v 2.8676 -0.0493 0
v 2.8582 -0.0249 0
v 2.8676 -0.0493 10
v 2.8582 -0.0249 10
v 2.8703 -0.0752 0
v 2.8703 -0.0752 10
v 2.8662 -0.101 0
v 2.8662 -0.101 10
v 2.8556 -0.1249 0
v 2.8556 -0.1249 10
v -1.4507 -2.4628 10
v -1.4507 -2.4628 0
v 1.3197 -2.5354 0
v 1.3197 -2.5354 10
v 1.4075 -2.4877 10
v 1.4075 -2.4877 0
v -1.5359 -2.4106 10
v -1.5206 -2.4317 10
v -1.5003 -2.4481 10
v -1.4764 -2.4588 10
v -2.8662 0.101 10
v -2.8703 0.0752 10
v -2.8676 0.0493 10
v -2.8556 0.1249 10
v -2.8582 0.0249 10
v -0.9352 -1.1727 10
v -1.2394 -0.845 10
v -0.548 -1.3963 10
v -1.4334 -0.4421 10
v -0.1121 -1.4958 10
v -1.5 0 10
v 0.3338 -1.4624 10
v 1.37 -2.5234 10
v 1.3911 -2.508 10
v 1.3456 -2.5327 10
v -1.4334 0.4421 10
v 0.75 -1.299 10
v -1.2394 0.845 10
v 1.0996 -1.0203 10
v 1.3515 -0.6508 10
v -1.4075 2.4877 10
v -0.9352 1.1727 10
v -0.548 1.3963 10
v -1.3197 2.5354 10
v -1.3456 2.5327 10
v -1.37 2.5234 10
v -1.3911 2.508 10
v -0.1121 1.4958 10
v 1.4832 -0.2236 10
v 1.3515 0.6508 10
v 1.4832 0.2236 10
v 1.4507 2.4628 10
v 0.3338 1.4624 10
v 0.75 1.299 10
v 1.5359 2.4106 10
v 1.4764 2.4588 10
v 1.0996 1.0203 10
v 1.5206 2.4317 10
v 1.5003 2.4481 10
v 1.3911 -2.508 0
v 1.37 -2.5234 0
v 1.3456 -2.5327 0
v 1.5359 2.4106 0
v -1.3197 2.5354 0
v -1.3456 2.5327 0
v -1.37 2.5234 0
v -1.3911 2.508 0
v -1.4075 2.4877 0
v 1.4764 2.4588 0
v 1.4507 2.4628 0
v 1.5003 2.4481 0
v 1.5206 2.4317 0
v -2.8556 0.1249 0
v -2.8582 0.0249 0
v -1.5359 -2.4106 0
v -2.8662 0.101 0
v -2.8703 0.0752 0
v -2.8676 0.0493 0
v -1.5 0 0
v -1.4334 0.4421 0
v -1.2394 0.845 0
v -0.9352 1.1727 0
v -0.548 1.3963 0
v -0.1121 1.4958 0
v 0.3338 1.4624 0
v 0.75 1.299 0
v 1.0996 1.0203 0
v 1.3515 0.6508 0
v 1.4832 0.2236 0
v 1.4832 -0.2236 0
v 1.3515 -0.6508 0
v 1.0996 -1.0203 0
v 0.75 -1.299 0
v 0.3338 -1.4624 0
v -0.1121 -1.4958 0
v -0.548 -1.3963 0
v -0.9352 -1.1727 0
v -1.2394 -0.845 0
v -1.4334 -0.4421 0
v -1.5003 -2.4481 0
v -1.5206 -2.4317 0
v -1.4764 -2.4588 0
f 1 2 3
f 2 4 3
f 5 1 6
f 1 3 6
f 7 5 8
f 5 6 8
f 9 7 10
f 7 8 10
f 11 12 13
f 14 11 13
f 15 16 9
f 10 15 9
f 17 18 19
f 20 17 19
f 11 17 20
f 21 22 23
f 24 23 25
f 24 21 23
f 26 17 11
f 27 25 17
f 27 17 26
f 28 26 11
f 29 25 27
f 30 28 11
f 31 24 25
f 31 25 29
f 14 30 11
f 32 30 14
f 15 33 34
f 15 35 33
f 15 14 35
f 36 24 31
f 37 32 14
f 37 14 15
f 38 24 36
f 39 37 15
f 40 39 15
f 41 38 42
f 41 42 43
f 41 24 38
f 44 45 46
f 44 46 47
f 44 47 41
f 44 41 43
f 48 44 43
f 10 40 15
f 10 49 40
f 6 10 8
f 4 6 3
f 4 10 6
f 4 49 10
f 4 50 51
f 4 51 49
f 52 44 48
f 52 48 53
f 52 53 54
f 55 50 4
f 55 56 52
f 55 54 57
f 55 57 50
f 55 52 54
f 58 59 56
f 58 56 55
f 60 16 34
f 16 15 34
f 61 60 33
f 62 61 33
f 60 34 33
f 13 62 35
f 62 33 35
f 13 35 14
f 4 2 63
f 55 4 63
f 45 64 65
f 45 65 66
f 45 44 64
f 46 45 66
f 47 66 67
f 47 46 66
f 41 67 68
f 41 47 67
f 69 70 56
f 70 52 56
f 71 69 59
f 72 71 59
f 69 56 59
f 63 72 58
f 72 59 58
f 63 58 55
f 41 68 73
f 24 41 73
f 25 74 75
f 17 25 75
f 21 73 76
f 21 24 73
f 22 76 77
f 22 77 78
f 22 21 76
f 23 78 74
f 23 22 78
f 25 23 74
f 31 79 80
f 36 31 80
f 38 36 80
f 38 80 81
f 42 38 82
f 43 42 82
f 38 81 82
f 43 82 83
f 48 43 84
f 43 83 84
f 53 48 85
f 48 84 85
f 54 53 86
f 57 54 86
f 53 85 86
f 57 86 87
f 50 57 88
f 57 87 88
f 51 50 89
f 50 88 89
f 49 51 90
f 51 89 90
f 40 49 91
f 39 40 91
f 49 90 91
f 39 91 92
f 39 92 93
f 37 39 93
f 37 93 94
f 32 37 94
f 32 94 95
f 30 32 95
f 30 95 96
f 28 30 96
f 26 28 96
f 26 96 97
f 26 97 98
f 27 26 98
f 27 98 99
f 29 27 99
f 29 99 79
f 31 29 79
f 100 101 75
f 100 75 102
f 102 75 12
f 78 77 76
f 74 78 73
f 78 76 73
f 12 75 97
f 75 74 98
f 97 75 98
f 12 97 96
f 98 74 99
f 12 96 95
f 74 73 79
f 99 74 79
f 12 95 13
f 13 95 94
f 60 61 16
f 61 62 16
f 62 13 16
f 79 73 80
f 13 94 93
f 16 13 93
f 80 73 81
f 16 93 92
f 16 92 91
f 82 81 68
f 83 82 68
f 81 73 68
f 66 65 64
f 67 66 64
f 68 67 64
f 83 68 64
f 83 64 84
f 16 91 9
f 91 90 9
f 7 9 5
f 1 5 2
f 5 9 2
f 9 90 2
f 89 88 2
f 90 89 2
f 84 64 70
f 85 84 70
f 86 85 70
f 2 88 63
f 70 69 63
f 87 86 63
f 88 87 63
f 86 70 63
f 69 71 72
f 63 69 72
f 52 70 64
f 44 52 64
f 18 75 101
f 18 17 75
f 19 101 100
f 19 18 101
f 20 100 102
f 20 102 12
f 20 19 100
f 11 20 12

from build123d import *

# Parameters (mm, degrees)
BOSS_EXTRUDE1_DEPTH = 10
M3_TAPPED_HOLE1_D   = 3
FILLET1_R           = 0.1


with BuildPart() as part:
    # Sketch1 → Boss-Extrude1 (new body)
    with BuildSketch(Plane.XY):
        Polygon((1.508379031, 2.461326072), (-1.37738139, 2.536957595), (-2.885760421, 0.075631523), (-1.508379031, -2.461326072), (1.37738139, -2.536957595), (2.885760421, -0.075631523), align=None)
    extrude(amount=BOSS_EXTRUDE1_DEPTH)

    # M3 Tapped Hole1 (through all)
    with Locations(Plane.XY.offset(10)):
        with Locations((0, 0)):
            Hole(M3_TAPPED_HOLE1_D / 2)

    # Fillet1
    fillet1_edges = [part.edges().sort_by_distance(p)[0] for p in [
        (2.885760421, -0.075631523, 5),
        (1.37738139, -2.536957595, 5),
        (-1.508379031, -2.461326072, 5),
        (-2.885760421, 0.075631523, 5),
        (-1.37738139, 2.536957595, 5),
        (1.508379031, 2.461326072, 5),
    ]]
    fillet(fillet1_edges, radius=FILLET1_R)


solid = part.part
